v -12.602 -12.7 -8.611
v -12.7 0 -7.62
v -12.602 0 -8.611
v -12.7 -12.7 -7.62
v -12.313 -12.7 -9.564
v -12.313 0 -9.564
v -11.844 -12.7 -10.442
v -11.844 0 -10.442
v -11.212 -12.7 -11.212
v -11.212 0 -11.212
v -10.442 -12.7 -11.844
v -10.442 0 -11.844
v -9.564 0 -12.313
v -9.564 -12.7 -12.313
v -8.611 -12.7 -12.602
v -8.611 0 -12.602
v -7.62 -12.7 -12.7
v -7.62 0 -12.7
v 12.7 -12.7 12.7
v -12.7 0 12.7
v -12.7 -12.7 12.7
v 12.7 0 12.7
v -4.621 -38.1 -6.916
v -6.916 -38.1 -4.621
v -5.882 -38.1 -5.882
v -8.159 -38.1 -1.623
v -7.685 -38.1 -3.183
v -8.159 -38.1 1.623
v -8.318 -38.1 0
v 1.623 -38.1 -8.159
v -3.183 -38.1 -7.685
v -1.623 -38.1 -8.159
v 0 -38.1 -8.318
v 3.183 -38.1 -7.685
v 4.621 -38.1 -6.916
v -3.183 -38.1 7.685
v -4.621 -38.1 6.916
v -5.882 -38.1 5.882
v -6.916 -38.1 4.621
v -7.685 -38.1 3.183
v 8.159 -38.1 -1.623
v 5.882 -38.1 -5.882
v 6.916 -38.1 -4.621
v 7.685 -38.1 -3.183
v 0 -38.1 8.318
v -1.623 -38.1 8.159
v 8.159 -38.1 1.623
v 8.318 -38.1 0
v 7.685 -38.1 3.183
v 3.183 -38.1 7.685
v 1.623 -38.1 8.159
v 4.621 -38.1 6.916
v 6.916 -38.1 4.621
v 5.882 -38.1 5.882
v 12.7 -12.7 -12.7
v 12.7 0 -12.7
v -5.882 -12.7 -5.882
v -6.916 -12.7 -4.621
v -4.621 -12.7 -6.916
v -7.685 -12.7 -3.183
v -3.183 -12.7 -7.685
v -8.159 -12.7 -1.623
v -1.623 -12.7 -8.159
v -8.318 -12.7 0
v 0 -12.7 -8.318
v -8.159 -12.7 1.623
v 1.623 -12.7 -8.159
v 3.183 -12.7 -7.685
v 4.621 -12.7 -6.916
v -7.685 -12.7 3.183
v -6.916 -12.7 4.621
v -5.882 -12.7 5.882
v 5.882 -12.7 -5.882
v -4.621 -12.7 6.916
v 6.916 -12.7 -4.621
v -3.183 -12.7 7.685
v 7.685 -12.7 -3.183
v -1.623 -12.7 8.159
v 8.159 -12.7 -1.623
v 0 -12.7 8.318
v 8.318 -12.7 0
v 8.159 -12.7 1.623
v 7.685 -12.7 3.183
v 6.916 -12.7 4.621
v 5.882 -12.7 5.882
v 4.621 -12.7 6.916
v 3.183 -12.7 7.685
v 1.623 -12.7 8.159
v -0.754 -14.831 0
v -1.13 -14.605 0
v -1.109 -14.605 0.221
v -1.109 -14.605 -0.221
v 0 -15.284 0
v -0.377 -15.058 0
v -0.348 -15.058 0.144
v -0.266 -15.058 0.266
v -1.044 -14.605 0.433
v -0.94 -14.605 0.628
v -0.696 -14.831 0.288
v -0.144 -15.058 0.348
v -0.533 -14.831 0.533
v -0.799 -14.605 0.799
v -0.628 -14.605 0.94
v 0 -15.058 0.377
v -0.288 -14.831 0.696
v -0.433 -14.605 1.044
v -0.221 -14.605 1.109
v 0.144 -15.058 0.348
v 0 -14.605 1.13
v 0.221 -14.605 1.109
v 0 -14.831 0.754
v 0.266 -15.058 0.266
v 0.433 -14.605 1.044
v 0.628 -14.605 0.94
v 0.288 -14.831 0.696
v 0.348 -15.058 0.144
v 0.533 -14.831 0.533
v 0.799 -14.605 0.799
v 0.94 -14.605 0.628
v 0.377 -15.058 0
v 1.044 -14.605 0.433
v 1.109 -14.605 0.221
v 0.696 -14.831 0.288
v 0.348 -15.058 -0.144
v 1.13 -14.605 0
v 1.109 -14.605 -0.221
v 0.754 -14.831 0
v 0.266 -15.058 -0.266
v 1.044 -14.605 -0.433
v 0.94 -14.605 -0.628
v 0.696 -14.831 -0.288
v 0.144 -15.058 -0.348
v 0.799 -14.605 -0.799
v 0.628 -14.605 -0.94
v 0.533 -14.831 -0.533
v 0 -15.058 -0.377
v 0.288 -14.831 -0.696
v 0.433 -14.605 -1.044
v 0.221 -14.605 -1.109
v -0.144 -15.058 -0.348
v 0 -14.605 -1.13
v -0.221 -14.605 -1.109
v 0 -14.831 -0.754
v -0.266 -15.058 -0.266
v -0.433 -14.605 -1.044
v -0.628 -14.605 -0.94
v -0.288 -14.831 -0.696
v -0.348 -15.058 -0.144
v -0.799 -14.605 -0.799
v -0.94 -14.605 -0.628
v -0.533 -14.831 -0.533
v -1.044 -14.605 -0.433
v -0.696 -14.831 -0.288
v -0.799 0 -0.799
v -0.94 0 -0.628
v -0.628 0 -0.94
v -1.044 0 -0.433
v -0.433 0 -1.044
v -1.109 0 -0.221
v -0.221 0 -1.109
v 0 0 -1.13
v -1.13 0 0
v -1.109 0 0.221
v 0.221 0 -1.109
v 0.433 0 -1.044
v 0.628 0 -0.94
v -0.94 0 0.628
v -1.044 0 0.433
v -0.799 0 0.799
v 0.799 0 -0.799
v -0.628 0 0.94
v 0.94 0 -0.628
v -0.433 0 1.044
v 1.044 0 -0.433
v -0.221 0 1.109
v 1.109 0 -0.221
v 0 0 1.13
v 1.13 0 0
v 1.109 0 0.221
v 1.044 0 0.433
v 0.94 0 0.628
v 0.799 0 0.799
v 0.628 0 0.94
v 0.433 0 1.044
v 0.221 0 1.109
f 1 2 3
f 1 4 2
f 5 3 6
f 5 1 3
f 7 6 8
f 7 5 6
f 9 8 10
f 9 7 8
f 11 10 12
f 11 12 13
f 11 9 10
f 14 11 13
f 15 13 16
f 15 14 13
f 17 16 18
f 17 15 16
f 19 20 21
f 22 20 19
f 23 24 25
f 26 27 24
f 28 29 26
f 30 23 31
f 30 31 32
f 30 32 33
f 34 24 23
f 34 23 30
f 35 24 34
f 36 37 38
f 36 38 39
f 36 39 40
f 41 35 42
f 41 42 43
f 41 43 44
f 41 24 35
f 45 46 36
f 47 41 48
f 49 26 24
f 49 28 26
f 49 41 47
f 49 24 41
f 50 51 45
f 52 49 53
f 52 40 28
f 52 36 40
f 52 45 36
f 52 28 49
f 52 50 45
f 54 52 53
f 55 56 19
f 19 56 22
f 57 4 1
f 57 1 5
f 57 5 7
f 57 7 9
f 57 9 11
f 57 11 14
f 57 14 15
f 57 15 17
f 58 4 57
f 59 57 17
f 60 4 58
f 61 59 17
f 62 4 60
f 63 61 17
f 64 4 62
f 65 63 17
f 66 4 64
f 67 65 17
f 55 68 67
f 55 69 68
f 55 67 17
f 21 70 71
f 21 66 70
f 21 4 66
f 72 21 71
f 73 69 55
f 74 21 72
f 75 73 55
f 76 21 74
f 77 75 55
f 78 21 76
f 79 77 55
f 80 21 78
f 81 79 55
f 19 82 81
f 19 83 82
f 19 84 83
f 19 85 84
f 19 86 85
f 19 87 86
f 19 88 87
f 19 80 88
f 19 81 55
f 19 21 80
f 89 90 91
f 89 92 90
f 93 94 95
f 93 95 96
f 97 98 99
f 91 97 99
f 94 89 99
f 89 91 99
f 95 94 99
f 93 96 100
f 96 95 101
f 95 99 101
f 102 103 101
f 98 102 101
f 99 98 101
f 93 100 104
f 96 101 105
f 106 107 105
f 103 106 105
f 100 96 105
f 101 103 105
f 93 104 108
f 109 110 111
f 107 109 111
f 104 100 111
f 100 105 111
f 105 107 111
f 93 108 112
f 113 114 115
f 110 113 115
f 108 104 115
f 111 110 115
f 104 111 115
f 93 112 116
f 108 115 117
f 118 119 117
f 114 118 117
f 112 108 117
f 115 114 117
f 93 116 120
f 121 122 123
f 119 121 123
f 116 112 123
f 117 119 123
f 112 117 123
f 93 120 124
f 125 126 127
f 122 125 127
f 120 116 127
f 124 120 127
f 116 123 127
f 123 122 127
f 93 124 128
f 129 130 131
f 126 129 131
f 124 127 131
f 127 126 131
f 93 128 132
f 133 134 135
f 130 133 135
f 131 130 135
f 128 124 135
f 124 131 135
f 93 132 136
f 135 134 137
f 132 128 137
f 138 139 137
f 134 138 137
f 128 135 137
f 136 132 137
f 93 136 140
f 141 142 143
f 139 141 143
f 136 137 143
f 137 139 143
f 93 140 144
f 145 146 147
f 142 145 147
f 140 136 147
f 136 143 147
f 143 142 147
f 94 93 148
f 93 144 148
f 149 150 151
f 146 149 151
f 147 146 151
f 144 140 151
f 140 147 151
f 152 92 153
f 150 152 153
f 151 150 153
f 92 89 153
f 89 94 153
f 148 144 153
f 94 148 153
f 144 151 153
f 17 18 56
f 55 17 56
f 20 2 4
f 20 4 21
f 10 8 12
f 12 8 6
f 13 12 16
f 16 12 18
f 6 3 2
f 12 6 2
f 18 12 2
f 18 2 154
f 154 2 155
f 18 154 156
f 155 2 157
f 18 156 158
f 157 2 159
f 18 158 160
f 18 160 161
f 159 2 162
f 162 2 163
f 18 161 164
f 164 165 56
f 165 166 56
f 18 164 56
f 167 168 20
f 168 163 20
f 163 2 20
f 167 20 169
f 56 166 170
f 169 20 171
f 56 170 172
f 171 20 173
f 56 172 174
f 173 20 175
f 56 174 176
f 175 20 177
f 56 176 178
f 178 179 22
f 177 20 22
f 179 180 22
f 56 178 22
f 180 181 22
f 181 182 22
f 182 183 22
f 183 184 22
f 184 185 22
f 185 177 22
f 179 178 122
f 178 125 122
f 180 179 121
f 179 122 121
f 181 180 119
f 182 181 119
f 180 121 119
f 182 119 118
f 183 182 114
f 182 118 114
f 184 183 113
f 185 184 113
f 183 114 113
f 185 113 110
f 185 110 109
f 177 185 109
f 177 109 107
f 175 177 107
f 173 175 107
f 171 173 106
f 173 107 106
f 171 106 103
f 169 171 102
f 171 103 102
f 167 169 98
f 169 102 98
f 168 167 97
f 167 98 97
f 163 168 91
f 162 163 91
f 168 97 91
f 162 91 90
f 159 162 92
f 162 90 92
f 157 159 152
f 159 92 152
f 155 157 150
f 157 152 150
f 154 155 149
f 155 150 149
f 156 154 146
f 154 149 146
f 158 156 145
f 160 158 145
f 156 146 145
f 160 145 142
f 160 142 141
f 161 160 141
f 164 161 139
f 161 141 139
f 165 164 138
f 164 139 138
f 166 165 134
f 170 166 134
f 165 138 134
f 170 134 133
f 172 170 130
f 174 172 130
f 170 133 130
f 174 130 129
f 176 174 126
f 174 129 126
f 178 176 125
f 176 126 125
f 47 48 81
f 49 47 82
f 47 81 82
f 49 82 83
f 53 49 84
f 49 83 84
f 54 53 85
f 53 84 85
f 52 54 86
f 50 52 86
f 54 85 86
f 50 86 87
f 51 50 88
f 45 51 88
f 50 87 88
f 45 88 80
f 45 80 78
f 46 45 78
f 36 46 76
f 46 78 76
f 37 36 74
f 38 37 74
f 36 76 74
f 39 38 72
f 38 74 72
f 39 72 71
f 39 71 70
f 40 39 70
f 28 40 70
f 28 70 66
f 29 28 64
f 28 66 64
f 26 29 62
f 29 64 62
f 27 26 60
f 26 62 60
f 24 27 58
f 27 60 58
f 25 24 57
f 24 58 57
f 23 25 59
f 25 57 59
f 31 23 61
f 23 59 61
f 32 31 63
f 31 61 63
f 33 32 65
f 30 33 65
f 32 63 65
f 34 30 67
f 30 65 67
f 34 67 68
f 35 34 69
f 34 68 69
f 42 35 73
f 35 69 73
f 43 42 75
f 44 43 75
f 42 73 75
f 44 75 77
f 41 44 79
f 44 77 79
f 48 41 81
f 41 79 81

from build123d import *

# Parameters (mm, degrees)
F0_W     = 25.4
F0_H     = 25.4
F1_DEPTH = 12.7
F2_R     = 8.3183998394
F3_DEPTH = 25.4
F4_R     = 5.08
F6_D     = 2.2606
F6_DEPTH = 14.605
F6_TIP   = 0.6791527577


with BuildPart() as f1:
    # F0 (on Front) → F1 (new body)
    with BuildSketch(Plane.XZ):
        Rectangle(F0_W, F0_H)
    extrude(amount=F1_DEPTH)

    # F2 (on face) → F3 (join)
    with BuildSketch(Plane.XZ.offset(12.7)):
        Circle(F2_R)
    extrude(amount=F3_DEPTH)

    # F4
    f4_edges = [f1.edges().sort_by_distance(p)[0] for p in [
        (-12.7, -6.35, -12.7),
    ]]
    fillet(f4_edges, radius=F4_R)

    # F6
    with Locations(Plane(origin=(0, 0, 0), x_dir=(-1, 0, 0), z_dir=(0, 1, 0))):
        with Locations((0, 0)):
            Hole(F6_D / 2, depth=F6_DEPTH)
            with Locations((0, 0, -(F6_DEPTH + F6_TIP / 2))):  # 118° drill point
                Cone(0, F6_D / 2, F6_TIP, mode=Mode.SUBTRACT)


solid = f1.part
